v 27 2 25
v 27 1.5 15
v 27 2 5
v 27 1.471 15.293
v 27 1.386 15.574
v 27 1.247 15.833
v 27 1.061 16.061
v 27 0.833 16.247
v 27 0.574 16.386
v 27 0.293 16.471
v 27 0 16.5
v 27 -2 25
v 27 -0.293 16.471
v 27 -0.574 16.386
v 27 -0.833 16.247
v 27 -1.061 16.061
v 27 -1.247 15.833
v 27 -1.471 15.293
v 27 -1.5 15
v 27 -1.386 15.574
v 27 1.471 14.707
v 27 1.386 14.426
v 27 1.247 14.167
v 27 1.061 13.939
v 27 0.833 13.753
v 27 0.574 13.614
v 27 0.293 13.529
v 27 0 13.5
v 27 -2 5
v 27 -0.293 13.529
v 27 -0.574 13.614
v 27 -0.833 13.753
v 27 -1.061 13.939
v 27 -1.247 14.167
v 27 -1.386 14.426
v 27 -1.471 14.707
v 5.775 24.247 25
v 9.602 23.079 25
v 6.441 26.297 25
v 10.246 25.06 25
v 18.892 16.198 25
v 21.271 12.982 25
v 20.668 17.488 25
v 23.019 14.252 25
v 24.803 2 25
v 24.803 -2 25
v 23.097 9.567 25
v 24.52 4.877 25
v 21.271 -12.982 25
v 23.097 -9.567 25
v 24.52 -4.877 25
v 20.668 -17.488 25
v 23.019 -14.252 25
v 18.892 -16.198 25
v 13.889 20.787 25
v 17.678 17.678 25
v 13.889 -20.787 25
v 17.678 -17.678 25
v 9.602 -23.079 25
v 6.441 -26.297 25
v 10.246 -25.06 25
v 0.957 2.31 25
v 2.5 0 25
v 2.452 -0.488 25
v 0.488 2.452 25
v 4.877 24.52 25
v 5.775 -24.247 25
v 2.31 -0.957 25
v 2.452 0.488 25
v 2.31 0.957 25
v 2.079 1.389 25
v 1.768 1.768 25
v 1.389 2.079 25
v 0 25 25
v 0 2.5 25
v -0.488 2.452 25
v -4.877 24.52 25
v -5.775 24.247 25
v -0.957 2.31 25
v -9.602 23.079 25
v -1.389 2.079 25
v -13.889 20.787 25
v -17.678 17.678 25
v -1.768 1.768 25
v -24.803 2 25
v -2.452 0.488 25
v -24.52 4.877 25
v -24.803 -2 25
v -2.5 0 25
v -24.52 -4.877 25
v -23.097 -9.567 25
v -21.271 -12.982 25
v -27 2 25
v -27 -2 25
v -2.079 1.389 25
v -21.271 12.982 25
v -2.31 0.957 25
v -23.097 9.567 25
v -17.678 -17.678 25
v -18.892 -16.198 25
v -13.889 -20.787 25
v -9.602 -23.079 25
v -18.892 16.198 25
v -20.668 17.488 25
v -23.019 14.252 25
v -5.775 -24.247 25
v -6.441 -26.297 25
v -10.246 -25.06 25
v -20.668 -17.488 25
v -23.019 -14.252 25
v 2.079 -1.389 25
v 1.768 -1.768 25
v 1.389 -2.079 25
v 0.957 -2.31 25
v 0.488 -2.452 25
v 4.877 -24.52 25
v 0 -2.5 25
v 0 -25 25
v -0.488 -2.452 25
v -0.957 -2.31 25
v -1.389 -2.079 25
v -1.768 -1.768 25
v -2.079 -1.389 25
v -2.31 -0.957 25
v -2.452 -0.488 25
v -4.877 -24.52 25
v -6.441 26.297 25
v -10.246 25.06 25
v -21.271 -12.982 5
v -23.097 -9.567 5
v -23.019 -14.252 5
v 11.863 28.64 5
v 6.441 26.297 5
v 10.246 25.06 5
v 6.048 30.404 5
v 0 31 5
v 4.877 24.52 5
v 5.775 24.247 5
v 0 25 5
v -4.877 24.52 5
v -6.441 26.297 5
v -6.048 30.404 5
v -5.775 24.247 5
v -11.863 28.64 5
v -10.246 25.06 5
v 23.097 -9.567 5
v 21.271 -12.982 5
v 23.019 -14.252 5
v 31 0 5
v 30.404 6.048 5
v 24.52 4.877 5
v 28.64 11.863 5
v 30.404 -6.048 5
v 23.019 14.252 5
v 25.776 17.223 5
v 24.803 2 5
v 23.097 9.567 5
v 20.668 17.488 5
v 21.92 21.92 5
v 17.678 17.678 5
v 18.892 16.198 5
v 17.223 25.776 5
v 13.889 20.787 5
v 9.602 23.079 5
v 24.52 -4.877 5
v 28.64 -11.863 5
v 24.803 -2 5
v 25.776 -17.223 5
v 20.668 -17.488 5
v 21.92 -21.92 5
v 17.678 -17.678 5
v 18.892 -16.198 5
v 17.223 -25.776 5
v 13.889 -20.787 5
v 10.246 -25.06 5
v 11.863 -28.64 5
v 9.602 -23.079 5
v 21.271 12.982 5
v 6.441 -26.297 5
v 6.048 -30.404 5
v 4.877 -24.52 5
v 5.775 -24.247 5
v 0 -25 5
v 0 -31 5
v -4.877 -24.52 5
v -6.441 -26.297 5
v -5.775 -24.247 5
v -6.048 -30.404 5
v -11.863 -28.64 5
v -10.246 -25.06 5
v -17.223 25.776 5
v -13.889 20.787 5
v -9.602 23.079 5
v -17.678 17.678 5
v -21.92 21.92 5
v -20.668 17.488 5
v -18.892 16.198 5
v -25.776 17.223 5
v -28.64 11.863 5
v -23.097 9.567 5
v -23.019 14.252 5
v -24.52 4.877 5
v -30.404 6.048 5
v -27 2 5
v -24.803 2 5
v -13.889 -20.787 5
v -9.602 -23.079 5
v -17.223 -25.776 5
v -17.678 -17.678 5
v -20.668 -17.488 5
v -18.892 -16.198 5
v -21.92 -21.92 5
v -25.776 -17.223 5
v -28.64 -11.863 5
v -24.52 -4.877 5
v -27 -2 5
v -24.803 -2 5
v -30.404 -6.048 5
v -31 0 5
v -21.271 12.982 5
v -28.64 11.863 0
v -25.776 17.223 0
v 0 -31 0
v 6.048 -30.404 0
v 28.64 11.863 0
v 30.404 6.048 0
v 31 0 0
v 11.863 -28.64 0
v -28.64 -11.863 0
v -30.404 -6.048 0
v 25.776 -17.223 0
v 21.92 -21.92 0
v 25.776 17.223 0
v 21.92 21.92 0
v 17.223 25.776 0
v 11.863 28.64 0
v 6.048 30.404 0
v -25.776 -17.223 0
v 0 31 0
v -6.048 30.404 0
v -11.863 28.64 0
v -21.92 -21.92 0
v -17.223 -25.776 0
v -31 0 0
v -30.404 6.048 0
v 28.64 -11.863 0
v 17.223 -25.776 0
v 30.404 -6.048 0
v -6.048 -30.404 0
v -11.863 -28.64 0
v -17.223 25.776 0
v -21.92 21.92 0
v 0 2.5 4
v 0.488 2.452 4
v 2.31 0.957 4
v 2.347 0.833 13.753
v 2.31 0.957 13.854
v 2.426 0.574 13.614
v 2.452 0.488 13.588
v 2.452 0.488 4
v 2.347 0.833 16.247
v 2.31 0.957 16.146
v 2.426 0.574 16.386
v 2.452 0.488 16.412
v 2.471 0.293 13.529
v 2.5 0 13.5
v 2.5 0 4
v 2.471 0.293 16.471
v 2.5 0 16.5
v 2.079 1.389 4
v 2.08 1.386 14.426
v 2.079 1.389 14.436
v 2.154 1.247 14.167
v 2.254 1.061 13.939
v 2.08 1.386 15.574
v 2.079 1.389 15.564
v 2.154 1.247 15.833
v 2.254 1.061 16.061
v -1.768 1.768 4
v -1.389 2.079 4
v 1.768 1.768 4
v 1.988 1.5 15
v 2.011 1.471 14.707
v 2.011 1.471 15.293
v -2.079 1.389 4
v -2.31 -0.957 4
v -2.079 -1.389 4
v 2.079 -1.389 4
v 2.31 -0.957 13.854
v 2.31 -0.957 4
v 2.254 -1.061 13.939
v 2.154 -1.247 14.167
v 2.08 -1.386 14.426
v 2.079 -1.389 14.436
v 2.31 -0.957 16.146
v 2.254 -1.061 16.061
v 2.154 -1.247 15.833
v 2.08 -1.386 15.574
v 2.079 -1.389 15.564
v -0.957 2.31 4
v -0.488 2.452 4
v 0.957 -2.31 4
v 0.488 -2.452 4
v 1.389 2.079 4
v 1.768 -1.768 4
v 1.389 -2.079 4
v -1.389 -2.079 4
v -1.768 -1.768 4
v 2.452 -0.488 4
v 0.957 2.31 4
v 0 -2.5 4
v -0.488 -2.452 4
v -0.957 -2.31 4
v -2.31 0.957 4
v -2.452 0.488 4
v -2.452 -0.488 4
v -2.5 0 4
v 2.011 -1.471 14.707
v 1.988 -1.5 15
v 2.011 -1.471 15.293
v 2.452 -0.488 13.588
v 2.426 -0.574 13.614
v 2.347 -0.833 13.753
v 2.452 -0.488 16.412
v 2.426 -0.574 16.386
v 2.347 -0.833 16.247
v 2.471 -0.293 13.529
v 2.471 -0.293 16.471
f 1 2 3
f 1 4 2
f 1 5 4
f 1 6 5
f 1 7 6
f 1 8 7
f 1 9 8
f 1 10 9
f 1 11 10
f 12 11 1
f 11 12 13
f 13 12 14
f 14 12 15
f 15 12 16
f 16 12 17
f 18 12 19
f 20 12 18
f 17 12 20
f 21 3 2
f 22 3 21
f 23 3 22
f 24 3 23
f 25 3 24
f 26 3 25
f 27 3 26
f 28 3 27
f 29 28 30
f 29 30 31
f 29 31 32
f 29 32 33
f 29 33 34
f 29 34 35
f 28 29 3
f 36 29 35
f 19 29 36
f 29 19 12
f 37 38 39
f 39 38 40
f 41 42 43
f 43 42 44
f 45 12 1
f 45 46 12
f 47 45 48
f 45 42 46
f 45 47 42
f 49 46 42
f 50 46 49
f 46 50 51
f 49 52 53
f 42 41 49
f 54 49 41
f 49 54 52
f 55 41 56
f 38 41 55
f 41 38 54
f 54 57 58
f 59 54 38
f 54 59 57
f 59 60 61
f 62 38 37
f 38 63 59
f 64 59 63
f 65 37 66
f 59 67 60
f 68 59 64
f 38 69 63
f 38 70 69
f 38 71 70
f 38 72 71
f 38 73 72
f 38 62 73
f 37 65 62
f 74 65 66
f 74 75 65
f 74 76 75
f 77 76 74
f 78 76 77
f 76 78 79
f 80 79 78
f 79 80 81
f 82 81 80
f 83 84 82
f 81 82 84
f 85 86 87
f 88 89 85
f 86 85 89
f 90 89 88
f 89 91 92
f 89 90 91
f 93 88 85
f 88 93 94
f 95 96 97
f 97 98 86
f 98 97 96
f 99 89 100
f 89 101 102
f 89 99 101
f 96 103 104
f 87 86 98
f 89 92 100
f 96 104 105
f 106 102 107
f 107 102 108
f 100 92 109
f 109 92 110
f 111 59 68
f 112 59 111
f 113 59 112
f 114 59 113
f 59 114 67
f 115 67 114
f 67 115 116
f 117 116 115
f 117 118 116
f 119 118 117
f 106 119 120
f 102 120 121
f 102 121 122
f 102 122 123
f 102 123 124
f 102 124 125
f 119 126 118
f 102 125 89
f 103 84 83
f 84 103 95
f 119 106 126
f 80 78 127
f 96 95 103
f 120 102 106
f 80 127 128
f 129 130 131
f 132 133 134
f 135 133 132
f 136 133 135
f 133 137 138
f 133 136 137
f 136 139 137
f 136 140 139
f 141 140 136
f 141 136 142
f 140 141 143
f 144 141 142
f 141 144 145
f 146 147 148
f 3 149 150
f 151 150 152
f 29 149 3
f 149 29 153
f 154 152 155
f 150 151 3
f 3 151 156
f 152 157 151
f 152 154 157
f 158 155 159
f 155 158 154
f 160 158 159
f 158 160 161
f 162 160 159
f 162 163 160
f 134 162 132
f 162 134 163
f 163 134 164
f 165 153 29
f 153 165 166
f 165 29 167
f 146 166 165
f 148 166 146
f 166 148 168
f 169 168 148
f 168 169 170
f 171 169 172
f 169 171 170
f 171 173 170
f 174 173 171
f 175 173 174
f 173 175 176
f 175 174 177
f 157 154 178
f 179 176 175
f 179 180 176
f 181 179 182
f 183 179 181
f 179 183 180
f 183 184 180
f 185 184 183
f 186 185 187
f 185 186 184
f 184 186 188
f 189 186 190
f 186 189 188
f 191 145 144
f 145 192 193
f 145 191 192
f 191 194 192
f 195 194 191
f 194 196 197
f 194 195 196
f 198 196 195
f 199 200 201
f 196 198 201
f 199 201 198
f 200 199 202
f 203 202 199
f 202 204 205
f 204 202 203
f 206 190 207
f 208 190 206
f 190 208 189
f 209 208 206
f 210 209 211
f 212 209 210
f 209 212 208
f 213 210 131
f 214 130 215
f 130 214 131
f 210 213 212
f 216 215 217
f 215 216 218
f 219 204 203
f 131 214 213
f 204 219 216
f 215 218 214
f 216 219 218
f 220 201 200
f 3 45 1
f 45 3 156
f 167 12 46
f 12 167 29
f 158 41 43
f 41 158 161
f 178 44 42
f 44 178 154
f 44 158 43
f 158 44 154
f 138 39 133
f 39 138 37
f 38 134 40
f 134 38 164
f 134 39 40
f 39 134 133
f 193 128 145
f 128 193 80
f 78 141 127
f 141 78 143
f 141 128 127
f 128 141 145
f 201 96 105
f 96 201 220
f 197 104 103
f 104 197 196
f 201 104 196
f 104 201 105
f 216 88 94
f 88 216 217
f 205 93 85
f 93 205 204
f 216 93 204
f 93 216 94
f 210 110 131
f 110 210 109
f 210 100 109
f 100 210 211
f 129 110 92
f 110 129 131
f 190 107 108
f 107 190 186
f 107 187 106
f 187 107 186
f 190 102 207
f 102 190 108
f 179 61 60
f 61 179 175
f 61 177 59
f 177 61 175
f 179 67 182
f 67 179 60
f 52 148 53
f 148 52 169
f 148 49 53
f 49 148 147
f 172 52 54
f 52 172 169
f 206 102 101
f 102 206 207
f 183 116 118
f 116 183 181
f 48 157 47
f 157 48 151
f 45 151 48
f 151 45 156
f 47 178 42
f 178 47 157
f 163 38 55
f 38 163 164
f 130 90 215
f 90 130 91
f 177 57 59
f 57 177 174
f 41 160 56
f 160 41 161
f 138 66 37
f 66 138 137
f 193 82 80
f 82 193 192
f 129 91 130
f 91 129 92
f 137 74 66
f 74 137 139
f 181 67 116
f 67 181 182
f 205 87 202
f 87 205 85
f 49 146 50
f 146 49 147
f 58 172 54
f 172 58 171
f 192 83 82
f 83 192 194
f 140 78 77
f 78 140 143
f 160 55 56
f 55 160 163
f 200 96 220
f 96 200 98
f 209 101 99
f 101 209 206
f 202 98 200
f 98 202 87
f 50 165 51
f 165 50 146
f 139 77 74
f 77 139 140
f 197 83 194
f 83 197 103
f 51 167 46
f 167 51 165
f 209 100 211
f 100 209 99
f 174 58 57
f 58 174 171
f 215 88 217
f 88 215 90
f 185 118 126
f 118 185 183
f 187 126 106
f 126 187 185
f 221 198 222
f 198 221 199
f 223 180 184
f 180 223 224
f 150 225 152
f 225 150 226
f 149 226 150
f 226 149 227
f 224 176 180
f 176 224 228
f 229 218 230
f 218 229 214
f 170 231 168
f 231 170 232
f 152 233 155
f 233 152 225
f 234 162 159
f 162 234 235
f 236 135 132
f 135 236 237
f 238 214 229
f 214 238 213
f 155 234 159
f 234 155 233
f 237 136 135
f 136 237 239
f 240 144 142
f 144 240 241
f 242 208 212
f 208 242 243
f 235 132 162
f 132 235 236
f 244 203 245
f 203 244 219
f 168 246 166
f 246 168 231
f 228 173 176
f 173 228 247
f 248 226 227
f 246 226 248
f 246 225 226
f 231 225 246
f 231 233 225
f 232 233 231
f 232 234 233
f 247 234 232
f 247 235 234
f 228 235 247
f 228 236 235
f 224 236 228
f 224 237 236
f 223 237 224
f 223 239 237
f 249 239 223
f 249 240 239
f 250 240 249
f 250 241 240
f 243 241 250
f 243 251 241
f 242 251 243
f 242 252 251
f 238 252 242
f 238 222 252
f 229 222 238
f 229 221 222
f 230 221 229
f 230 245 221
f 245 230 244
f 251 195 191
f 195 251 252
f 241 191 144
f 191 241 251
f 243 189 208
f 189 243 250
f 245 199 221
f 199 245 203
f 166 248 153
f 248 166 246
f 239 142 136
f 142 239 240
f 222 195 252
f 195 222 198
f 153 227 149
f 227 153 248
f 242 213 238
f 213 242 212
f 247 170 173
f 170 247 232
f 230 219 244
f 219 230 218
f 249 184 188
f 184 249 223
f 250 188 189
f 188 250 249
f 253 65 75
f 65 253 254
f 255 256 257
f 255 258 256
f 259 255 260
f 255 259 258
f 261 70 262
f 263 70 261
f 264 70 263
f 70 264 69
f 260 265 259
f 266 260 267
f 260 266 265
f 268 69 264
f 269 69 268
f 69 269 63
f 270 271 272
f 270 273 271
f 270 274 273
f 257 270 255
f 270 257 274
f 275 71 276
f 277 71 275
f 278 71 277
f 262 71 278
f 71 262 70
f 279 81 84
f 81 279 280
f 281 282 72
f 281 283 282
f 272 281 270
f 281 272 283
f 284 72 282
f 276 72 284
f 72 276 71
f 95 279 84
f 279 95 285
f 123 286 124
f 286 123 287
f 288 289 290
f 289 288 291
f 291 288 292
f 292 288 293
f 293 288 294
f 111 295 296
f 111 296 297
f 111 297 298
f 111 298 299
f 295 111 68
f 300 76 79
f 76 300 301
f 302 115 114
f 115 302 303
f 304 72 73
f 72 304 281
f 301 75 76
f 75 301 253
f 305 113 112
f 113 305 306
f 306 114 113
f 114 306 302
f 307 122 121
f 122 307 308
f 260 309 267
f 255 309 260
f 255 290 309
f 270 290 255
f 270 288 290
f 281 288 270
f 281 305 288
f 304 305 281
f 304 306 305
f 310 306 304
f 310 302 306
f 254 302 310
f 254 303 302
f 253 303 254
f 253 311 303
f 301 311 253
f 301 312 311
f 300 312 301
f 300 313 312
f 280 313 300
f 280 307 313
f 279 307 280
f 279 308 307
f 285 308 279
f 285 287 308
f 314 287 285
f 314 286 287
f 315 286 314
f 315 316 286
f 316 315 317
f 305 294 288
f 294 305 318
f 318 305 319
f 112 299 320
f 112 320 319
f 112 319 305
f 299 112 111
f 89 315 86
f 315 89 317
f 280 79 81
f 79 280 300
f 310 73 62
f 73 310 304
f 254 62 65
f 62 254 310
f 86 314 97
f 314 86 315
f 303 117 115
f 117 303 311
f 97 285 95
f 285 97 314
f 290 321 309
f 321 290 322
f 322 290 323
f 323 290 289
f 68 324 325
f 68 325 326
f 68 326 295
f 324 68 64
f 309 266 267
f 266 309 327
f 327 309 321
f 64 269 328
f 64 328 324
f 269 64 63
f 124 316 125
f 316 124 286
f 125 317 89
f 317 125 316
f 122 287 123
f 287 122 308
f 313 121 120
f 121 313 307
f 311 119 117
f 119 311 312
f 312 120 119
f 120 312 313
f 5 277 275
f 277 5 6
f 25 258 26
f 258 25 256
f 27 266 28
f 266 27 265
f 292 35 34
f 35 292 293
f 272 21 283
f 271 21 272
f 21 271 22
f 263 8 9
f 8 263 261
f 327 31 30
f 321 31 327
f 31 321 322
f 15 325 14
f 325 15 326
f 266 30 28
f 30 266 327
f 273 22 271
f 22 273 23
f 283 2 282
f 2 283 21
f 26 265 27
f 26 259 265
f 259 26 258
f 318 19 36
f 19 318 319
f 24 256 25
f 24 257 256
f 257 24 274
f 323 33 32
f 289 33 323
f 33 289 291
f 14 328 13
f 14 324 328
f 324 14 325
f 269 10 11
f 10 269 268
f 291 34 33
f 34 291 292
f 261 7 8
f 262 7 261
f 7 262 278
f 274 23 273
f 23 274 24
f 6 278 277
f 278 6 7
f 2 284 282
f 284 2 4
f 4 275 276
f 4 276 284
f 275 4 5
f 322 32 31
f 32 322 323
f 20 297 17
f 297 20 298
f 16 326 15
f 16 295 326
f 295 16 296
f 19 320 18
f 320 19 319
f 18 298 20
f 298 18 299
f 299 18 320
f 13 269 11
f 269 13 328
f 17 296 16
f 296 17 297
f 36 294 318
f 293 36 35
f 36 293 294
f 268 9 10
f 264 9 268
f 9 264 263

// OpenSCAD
$fn = 32;

// ----------------------------------------------------------------------
// Control knob: skirt knob with grip ribs
// ----------------------------------------------------------------------

// --- parameters (mm) ---
skirt_d = 62;             // skirt diameter
skirt_t = 5;              // skirt thickness
rib_w = 4;                // grip rib width
rib_out = 3;              // grip rib radial protrusion
n_ribs = 10;              // number of grip ribs
knob_d = 50;              // knob body diameter
knob_h = 20;              // knob body height
bore_d = 5;               // shaft bore diameter
set_d = 3;                // set screw bore diameter

rib_step = 360 / n_ribs;  // rib angular step
total_h = skirt_t + knob_h;  // overall height

difference() {
  union() {
    translate([0, 0, skirt_t]) cylinder(h = knob_h, d = knob_d);
    cylinder(h = skirt_t, d = skirt_d);
    for (i = [0 : n_ribs - 1])
      rotate([0, 0, i * rib_step])
        translate([knob_d / 2 - 1, -rib_w / 2, skirt_t])
          cube([rib_out, rib_w, knob_h]);
  }
  translate([0, 0, skirt_t - 1]) cylinder(h = knob_h + 2, d = bore_d);
  translate([-1, 0, skirt_t + knob_h / 2]) rotate([0, 90, 0])
    cylinder(h = knob_d / 2 + bore_d / 2 + 2, d = set_d);
}
